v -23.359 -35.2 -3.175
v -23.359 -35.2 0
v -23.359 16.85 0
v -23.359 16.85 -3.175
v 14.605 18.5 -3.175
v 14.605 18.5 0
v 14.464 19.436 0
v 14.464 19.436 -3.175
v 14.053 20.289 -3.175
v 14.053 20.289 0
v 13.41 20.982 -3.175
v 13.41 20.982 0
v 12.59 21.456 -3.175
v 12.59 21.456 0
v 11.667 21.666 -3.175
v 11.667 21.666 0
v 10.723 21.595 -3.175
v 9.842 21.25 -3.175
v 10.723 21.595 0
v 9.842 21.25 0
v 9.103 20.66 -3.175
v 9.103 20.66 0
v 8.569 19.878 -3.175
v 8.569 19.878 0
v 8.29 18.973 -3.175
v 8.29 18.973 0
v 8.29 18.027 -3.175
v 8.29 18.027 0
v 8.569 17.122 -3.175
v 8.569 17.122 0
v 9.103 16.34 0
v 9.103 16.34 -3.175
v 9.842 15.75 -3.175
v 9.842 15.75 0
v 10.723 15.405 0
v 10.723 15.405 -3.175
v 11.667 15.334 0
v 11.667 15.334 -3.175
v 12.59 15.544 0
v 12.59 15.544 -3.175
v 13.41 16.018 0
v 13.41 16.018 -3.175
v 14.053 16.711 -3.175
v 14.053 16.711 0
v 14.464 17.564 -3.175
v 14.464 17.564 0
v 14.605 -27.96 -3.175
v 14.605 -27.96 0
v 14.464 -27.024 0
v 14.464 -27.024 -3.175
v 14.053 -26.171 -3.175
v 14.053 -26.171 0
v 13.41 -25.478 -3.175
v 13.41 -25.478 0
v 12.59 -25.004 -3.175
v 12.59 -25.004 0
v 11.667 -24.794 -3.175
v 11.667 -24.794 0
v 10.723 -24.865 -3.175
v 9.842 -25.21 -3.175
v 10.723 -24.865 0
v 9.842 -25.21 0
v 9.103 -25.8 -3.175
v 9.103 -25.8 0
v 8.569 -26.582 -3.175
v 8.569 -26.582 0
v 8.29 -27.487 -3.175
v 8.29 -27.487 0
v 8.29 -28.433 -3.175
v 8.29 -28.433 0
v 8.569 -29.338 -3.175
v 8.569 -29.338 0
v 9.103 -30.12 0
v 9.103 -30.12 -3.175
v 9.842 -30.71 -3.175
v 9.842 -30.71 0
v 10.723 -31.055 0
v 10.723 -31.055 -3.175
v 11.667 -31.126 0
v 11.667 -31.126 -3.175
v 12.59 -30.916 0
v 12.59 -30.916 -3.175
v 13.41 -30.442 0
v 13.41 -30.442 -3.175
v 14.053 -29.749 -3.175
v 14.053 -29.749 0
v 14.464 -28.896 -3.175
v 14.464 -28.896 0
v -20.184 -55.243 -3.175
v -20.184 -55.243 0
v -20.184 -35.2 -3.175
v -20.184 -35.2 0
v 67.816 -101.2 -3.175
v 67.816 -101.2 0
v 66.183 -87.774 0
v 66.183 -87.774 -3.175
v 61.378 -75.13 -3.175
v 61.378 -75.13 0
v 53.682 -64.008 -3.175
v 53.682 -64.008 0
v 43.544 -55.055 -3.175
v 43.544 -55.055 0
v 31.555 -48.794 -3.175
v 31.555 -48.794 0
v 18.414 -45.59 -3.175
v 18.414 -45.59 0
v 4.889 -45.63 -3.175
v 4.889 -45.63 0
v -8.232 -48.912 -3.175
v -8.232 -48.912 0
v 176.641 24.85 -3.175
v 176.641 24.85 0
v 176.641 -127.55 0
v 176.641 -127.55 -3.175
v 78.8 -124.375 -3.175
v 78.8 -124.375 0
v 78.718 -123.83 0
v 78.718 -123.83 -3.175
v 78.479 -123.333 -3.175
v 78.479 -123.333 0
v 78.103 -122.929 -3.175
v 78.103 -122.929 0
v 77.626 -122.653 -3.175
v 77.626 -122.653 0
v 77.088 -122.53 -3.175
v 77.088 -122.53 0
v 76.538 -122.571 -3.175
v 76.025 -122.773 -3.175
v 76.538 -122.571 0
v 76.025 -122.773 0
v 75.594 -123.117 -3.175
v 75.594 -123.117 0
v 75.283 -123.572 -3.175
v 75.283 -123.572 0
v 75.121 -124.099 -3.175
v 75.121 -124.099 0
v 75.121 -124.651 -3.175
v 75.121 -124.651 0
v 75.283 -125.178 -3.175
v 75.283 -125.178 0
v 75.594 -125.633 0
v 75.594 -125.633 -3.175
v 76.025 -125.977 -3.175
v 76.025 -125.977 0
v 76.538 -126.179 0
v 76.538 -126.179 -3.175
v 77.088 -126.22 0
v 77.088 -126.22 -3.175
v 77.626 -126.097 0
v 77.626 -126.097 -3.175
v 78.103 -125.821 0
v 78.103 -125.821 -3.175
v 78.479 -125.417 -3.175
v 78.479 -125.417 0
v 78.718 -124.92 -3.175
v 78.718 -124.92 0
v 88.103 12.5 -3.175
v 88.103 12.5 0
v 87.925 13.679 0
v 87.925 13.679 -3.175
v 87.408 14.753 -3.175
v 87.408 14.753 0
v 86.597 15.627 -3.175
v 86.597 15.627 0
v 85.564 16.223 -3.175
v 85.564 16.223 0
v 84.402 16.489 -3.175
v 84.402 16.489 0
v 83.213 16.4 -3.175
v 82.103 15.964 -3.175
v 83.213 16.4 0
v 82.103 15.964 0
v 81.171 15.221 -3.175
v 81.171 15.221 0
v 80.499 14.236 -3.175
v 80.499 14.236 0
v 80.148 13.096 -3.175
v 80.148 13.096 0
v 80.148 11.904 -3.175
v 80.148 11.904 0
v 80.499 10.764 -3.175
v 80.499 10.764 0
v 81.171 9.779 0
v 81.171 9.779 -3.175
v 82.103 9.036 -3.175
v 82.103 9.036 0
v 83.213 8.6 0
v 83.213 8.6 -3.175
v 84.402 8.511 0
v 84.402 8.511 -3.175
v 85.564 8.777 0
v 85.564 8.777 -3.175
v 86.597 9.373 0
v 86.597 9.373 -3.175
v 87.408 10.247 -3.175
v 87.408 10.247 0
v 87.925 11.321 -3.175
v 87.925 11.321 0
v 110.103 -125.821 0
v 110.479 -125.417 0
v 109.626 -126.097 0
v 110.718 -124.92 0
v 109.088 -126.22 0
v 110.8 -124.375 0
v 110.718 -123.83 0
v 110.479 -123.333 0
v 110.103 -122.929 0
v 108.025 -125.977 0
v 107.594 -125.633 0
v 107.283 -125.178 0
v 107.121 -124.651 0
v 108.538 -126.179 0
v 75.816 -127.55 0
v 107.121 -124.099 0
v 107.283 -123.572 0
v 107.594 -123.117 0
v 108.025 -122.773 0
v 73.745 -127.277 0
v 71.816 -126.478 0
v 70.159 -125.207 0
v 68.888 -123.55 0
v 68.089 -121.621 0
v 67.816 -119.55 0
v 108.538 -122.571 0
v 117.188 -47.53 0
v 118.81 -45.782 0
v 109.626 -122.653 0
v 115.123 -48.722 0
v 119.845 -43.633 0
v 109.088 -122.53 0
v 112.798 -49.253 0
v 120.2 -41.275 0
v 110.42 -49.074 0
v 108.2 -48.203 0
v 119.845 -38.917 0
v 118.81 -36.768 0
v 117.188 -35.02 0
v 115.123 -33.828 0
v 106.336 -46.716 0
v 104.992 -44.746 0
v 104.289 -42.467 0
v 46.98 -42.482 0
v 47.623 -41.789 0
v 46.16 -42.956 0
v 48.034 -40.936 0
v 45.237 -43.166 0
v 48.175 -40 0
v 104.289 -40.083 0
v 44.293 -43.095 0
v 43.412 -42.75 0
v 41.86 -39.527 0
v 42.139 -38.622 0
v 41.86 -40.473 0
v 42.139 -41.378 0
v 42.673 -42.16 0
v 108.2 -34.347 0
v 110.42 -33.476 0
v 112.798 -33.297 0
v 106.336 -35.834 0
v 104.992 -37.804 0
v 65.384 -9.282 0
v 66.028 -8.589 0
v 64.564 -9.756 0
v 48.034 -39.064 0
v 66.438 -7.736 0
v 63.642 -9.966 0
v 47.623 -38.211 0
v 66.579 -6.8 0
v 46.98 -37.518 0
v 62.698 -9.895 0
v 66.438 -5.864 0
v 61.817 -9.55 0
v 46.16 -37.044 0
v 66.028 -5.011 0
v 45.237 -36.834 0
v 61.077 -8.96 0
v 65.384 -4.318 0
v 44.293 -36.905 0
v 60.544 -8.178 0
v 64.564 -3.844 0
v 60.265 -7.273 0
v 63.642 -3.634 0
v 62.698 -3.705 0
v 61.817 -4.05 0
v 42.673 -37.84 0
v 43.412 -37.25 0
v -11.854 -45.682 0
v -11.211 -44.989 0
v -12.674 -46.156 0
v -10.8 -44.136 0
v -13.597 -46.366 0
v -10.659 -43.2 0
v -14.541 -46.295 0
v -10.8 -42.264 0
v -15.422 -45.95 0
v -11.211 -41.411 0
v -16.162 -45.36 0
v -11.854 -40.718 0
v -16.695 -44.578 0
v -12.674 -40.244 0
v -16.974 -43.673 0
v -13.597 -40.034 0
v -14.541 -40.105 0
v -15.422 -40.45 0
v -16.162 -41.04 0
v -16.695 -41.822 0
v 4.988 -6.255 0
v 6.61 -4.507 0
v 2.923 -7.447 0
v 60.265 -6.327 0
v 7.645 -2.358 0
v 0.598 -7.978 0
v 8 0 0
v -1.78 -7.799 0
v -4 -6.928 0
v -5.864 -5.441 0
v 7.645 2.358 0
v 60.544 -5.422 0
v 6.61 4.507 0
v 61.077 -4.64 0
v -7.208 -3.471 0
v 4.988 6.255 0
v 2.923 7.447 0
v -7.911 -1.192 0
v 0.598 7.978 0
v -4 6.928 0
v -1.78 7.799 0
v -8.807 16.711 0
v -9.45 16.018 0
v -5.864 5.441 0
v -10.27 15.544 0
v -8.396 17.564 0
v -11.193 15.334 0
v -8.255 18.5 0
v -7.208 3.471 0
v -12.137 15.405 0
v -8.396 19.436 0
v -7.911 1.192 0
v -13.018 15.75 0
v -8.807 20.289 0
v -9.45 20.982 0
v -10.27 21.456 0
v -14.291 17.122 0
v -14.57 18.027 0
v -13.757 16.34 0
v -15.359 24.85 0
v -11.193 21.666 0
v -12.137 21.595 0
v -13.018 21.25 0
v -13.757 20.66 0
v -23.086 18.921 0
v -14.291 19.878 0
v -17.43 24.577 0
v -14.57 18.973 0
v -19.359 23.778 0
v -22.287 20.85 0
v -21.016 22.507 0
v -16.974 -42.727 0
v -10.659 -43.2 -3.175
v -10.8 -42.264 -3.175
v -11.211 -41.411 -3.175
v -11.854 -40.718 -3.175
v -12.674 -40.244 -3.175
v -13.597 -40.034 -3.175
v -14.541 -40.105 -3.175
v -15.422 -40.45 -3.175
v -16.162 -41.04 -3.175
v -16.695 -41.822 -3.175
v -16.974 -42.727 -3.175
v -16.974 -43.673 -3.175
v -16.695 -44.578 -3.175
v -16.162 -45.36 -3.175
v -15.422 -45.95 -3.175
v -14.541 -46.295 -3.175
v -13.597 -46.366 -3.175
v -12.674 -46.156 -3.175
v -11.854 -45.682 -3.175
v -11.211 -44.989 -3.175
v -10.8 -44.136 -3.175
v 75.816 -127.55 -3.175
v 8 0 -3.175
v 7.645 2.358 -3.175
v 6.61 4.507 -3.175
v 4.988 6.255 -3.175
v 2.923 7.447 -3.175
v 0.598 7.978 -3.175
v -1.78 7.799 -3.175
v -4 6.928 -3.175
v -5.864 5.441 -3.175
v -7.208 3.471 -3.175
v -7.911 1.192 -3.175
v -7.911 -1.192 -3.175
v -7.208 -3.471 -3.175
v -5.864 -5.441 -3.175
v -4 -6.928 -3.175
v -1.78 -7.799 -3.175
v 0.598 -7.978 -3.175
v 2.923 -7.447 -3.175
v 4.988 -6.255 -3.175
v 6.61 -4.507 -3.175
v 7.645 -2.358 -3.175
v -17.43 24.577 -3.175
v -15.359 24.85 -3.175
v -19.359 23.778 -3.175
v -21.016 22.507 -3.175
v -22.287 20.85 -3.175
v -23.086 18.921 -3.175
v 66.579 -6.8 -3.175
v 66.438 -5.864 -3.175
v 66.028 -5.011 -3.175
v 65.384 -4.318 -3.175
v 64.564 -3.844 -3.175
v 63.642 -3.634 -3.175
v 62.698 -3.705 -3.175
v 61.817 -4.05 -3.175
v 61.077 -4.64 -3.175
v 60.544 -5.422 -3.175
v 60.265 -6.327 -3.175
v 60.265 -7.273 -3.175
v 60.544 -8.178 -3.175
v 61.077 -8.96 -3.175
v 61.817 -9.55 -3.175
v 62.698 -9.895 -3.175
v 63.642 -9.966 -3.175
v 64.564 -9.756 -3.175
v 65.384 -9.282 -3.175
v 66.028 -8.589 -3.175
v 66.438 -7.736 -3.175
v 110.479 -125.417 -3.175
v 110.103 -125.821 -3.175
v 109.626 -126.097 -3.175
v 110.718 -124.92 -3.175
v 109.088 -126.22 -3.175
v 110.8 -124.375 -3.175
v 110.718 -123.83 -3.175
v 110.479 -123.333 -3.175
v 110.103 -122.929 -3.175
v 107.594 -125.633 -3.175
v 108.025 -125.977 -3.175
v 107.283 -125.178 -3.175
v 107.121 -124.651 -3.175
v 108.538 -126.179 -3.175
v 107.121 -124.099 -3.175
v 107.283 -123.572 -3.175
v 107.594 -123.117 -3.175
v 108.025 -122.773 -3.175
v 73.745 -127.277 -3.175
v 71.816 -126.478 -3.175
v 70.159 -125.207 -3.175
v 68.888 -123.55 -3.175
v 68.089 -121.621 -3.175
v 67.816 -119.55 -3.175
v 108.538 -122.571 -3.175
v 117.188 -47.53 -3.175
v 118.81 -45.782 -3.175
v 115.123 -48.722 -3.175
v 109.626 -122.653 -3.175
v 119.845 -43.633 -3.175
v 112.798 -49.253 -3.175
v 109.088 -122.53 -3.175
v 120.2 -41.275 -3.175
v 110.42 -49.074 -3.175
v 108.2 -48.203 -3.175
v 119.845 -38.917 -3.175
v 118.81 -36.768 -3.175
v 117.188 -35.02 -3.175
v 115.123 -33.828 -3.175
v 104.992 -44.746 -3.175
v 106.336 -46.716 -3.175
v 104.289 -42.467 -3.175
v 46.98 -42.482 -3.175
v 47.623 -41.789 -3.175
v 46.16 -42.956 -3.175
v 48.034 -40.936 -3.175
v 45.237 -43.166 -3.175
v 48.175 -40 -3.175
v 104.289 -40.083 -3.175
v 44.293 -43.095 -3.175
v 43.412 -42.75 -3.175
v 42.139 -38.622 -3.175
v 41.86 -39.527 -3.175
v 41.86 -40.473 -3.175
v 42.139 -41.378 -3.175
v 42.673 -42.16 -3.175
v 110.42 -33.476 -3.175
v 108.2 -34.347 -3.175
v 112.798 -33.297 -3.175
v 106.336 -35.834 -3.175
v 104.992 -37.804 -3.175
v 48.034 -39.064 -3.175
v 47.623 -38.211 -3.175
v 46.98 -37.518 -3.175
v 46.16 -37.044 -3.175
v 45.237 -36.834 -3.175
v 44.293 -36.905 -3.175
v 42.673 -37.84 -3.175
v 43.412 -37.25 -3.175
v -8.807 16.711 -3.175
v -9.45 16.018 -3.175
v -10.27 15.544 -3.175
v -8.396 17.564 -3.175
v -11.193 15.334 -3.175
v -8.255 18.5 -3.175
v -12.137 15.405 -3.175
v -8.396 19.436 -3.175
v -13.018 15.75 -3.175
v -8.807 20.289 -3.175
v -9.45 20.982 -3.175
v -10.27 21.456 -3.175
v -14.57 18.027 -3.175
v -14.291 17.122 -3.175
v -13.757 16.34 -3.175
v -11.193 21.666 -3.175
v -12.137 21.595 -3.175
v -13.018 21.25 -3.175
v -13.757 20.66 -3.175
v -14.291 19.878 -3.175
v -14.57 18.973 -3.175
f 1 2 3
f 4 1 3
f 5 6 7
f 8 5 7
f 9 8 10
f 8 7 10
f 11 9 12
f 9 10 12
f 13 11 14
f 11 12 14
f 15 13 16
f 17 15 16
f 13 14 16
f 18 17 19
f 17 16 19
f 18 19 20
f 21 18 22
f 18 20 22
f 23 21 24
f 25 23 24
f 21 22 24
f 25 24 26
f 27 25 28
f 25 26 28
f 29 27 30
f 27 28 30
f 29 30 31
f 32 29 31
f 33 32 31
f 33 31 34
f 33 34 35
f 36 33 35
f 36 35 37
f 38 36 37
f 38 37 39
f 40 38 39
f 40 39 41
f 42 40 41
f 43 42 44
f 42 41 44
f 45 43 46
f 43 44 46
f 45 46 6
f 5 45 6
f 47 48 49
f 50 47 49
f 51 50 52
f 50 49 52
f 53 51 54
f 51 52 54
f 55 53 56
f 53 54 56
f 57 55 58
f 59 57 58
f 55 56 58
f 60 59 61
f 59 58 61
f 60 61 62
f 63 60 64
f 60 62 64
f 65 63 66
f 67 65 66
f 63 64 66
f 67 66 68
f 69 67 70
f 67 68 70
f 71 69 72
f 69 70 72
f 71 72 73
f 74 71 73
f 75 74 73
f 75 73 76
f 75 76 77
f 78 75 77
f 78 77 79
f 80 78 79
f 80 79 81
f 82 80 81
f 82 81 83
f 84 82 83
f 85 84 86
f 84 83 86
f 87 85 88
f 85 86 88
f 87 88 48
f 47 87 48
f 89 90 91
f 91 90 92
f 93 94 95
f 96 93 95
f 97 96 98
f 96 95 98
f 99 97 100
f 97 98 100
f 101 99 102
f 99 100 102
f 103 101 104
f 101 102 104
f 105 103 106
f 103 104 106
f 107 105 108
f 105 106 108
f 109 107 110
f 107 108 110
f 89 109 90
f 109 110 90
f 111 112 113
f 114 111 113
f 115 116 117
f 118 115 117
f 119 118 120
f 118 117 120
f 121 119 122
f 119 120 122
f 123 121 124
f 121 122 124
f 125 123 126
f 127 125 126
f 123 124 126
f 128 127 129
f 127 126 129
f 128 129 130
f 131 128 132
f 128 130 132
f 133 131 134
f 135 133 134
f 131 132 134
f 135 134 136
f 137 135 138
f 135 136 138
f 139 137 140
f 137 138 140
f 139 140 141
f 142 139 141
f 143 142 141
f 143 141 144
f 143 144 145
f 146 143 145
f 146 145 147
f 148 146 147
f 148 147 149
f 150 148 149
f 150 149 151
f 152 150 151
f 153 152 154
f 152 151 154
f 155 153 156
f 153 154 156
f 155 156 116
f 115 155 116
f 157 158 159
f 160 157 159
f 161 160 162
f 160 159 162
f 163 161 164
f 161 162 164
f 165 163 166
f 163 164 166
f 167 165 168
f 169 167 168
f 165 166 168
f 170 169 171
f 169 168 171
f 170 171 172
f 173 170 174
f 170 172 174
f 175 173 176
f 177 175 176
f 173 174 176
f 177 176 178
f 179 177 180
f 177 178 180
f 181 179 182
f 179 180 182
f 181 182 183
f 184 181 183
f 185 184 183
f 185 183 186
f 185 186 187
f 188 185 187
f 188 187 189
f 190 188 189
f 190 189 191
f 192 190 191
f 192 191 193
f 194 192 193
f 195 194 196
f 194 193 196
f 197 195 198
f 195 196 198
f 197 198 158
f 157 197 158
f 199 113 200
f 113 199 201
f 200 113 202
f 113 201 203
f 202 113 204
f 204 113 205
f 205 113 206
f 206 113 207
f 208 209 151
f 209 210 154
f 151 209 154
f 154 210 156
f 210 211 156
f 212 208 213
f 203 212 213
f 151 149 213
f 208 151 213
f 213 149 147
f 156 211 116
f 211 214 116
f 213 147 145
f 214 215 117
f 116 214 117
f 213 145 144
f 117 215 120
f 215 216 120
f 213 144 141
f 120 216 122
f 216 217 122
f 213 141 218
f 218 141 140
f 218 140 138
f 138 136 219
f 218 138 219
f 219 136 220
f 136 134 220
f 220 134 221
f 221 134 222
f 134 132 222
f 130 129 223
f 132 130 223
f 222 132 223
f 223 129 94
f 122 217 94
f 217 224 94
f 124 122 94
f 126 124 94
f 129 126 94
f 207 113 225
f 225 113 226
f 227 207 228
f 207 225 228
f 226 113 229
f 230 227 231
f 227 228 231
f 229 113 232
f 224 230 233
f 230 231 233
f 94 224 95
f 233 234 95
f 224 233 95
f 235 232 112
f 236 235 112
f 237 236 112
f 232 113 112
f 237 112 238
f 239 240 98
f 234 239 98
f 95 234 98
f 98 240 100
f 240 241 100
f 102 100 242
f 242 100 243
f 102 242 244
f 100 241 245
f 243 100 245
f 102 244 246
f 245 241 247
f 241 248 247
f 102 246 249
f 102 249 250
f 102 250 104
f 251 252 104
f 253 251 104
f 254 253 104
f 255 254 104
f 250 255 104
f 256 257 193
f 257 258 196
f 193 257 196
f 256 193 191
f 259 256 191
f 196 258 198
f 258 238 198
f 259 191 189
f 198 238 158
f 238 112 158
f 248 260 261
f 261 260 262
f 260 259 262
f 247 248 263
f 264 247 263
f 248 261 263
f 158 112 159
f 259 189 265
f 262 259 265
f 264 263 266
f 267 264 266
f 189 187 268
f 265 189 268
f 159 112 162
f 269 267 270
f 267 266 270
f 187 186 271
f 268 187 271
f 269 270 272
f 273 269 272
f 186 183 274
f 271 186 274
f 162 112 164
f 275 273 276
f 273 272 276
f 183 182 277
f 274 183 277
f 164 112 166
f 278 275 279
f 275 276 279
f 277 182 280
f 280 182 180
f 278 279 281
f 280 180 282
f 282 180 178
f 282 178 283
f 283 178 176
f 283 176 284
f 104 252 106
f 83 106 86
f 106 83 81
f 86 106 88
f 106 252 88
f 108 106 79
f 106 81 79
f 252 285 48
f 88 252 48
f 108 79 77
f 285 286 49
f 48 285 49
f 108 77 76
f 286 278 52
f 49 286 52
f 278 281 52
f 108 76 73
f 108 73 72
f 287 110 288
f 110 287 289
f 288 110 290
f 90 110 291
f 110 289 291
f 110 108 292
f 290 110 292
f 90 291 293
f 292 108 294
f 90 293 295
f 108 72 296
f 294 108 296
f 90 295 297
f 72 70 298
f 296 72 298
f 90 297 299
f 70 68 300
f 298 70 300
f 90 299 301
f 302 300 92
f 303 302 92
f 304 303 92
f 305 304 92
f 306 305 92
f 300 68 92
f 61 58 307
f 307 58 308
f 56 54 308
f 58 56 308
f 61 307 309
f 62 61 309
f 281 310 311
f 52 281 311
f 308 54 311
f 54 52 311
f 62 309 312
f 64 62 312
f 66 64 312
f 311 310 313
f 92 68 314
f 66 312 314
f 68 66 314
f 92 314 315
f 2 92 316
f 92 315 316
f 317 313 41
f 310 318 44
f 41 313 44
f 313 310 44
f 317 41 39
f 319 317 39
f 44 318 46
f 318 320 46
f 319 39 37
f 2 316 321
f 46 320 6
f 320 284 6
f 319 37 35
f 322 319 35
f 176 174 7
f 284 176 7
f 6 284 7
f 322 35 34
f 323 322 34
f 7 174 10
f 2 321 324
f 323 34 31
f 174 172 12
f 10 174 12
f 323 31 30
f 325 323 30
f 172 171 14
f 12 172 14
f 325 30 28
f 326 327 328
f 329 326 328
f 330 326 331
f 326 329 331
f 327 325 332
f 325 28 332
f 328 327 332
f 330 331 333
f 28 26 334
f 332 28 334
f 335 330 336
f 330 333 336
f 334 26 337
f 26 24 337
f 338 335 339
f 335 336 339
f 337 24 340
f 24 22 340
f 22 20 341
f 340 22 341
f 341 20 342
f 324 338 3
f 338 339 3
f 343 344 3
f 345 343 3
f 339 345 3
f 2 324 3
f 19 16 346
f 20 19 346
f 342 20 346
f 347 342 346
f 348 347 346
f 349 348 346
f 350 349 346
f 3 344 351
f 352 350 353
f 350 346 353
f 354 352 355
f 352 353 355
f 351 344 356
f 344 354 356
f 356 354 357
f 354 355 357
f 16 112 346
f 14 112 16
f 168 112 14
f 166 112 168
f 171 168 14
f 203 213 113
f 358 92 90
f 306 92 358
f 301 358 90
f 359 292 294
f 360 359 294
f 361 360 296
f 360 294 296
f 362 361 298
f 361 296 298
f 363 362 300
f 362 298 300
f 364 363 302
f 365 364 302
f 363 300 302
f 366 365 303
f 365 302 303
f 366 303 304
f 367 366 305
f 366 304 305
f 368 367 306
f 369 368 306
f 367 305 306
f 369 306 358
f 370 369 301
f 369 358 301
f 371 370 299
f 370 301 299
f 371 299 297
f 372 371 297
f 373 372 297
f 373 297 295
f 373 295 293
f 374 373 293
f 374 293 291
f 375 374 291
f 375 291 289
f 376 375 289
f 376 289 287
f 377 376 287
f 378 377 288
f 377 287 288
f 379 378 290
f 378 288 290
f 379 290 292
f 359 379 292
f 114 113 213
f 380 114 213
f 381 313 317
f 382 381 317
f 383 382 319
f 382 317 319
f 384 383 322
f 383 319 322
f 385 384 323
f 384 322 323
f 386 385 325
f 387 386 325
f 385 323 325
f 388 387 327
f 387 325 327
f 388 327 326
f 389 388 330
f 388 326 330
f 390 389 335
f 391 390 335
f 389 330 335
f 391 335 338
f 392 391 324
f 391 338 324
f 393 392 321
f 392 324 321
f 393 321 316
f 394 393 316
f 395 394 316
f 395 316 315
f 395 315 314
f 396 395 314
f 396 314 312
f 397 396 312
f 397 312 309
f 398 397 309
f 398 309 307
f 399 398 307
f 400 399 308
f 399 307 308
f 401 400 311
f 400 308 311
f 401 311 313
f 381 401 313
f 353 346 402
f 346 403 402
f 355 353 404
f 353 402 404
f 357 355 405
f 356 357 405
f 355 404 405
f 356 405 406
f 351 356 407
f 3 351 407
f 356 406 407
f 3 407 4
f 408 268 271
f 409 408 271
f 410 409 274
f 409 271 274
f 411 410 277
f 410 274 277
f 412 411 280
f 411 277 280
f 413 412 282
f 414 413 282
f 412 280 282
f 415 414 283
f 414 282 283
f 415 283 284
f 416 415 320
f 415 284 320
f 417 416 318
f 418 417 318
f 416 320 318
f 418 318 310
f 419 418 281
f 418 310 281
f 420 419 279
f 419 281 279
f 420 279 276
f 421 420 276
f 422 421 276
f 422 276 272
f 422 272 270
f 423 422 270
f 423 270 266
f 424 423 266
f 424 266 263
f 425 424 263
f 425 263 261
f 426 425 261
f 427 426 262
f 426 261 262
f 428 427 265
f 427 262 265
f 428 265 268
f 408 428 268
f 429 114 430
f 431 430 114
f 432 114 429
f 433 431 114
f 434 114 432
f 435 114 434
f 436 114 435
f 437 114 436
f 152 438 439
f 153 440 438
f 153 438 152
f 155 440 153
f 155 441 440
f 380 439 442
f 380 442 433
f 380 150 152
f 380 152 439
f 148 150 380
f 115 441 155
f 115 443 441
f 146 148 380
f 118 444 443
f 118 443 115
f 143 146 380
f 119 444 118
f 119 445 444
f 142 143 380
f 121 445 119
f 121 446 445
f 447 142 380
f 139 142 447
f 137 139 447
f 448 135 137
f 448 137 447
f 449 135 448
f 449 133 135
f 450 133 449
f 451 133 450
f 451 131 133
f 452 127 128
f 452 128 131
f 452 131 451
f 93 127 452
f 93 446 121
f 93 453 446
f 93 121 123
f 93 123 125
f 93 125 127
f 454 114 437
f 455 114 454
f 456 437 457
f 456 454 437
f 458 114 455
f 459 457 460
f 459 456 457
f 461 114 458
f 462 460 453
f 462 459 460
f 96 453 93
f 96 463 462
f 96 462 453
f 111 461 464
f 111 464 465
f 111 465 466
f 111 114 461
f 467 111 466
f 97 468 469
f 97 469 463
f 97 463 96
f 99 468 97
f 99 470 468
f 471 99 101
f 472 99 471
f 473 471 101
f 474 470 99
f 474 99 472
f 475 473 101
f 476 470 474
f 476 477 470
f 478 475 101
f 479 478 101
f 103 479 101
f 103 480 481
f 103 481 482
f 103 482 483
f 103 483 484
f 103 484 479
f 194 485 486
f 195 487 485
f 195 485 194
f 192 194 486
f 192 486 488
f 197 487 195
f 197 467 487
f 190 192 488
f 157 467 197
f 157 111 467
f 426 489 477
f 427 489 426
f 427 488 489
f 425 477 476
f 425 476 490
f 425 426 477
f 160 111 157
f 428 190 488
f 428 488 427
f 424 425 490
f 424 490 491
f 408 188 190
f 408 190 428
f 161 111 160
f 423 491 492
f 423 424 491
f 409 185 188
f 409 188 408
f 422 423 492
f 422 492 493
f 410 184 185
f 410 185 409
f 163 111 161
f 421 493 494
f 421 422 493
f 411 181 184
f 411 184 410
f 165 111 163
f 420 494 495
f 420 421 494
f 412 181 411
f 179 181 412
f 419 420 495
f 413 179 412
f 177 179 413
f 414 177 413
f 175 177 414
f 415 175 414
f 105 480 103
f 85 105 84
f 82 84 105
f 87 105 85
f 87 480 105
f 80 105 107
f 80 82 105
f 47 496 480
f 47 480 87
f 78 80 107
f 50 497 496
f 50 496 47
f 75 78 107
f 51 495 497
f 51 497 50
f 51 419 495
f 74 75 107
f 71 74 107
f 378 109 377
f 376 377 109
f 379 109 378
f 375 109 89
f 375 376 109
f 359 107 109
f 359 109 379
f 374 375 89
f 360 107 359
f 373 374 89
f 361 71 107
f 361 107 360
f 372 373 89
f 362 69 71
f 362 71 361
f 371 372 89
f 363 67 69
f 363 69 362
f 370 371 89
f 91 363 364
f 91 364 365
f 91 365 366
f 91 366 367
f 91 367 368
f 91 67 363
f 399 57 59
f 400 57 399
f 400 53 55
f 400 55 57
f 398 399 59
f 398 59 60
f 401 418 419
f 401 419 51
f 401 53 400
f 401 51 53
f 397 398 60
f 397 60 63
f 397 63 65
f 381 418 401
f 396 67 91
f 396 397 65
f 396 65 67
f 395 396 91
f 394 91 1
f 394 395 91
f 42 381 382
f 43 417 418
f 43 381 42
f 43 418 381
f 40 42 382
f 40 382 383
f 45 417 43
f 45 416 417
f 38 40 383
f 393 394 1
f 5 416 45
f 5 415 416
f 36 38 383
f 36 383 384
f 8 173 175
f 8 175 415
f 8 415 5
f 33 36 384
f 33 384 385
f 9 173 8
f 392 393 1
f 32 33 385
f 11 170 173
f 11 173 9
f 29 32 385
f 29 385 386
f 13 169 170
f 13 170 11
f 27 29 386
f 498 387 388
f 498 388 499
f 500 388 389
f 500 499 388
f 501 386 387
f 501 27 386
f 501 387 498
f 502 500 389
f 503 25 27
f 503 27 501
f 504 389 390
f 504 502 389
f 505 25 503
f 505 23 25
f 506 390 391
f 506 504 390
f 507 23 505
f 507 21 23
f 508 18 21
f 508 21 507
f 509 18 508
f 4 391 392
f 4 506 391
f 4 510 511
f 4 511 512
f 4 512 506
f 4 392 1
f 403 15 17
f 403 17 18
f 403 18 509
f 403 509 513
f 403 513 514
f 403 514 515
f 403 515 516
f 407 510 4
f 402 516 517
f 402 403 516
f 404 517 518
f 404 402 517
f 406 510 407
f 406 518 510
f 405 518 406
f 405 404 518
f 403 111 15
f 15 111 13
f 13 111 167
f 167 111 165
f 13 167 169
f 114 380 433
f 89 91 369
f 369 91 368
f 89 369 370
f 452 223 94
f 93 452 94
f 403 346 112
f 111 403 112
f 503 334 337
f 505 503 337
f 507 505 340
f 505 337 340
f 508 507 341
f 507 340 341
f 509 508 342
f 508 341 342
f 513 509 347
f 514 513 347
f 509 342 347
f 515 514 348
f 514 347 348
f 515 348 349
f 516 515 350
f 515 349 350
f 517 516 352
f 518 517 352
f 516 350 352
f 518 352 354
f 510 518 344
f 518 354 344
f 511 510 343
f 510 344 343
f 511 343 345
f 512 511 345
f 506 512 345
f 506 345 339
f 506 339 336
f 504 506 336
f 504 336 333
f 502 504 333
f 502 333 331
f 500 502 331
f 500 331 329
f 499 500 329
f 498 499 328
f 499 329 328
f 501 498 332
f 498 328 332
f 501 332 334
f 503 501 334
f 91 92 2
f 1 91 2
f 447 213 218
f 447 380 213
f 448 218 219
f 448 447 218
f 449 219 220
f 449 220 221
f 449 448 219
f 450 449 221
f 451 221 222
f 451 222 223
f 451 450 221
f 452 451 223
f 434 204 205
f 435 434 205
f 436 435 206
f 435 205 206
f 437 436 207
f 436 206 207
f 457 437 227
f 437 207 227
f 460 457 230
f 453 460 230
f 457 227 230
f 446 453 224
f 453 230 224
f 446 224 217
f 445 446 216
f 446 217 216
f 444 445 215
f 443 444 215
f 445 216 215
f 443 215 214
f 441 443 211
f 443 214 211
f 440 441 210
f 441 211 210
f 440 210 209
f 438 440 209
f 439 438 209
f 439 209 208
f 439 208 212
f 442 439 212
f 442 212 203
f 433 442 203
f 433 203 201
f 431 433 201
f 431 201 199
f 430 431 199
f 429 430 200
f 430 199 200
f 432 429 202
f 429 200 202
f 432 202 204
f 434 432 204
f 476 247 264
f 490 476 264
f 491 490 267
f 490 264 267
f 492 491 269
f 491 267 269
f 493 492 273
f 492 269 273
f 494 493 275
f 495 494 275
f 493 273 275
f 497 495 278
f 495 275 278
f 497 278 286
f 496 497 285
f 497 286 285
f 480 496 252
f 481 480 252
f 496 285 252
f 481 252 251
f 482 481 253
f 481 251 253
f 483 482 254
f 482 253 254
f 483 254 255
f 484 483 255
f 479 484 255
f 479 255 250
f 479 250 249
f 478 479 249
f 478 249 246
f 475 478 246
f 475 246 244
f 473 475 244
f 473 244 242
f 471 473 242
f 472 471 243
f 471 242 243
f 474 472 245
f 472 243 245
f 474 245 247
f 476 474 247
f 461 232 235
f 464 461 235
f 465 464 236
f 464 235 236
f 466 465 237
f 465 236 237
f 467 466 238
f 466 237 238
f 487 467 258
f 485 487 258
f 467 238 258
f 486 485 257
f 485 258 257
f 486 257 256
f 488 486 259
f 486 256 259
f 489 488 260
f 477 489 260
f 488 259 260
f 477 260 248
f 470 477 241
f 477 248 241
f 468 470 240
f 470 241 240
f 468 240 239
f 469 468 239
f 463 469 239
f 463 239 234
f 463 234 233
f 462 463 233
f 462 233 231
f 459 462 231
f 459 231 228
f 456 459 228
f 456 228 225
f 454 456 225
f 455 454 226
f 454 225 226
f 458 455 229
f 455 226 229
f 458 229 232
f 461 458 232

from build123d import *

# Parameters (mm, degrees)
SKETCH1_R           = 8
SKETCH1_R_2         = 3.175
SKETCH1_R_3         = 1.85
SKETCH1_R_4         = 4
BOSS_EXTRUDE1_DEPTH = 3.175
FILLET1_R           = 8
FILLET2_R           = 8


with BuildPart() as part:
    # Sketch1 → Boss-Extrude1 (new body)
    with BuildSketch(Plane.XY):
        with BuildLine():
            Line((176.640929786, -127.55), (67.815929786, -127.55))
            Line((67.815929786, -127.55), (67.815929786, -101.2))
            ThreePointArc((67.815929786, -101.2), (37.73889258, -51.561305416), (-20.184070214, -55.243498828))
            Line((-20.184070214, -55.243498828), (-20.184070214, -35.2))
            Line((-20.184070214, -35.2), (-23.359070214, -35.2))
            Line((-23.359070214, -35.2), (-23.359070214, 24.85))
            Line((-23.359070214, 24.85), (176.640929786, 24.85))
            Line((176.640929786, 24.85), (176.640929786, -127.55))
        make_face()
        with Locations((112.2, -41.275)):
            Circle(SKETCH1_R, mode=Mode.SUBTRACT)
        Circle(SKETCH1_R, mode=Mode.SUBTRACT)
        with Locations((11.43, -27.96)):
            Circle(SKETCH1_R_2, mode=Mode.SUBTRACT)
        with Locations((-11.43, 18.5)):
            Circle(SKETCH1_R_2, mode=Mode.SUBTRACT)
        with Locations((11.43, 18.5)):
            Circle(SKETCH1_R_2, mode=Mode.SUBTRACT)
        with Locations((45, -40)):
            Circle(SKETCH1_R_2, mode=Mode.SUBTRACT)
        with Locations((63.404393546, -6.8)):
            Circle(SKETCH1_R_2, mode=Mode.SUBTRACT)
        with Locations((108.95, -124.375)):
            Circle(SKETCH1_R_3, mode=Mode.SUBTRACT)
        with Locations((76.95, -124.375)):
            Circle(SKETCH1_R_3, mode=Mode.SUBTRACT)
        with Locations((-13.834070214, -43.2)):
            Circle(SKETCH1_R_2, mode=Mode.SUBTRACT)
        with Locations((84.102828318, 12.5)):
            Circle(SKETCH1_R_4, mode=Mode.SUBTRACT)
    extrude(amount=-BOSS_EXTRUDE1_DEPTH)

    # Fillet1
    fillet1_edges = [part.edges().sort_by_distance(p)[0] for p in [
        (67.815929786, -127.55, -1.5875),
    ]]
    fillet(fillet1_edges, radius=FILLET1_R)

    # Fillet2
    fillet2_edges = [part.edges().sort_by_distance(p)[0] for p in [
        (-23.359070214, 24.85, -1.5875),
    ]]
    fillet(fillet2_edges, radius=FILLET2_R)


solid = part.part
